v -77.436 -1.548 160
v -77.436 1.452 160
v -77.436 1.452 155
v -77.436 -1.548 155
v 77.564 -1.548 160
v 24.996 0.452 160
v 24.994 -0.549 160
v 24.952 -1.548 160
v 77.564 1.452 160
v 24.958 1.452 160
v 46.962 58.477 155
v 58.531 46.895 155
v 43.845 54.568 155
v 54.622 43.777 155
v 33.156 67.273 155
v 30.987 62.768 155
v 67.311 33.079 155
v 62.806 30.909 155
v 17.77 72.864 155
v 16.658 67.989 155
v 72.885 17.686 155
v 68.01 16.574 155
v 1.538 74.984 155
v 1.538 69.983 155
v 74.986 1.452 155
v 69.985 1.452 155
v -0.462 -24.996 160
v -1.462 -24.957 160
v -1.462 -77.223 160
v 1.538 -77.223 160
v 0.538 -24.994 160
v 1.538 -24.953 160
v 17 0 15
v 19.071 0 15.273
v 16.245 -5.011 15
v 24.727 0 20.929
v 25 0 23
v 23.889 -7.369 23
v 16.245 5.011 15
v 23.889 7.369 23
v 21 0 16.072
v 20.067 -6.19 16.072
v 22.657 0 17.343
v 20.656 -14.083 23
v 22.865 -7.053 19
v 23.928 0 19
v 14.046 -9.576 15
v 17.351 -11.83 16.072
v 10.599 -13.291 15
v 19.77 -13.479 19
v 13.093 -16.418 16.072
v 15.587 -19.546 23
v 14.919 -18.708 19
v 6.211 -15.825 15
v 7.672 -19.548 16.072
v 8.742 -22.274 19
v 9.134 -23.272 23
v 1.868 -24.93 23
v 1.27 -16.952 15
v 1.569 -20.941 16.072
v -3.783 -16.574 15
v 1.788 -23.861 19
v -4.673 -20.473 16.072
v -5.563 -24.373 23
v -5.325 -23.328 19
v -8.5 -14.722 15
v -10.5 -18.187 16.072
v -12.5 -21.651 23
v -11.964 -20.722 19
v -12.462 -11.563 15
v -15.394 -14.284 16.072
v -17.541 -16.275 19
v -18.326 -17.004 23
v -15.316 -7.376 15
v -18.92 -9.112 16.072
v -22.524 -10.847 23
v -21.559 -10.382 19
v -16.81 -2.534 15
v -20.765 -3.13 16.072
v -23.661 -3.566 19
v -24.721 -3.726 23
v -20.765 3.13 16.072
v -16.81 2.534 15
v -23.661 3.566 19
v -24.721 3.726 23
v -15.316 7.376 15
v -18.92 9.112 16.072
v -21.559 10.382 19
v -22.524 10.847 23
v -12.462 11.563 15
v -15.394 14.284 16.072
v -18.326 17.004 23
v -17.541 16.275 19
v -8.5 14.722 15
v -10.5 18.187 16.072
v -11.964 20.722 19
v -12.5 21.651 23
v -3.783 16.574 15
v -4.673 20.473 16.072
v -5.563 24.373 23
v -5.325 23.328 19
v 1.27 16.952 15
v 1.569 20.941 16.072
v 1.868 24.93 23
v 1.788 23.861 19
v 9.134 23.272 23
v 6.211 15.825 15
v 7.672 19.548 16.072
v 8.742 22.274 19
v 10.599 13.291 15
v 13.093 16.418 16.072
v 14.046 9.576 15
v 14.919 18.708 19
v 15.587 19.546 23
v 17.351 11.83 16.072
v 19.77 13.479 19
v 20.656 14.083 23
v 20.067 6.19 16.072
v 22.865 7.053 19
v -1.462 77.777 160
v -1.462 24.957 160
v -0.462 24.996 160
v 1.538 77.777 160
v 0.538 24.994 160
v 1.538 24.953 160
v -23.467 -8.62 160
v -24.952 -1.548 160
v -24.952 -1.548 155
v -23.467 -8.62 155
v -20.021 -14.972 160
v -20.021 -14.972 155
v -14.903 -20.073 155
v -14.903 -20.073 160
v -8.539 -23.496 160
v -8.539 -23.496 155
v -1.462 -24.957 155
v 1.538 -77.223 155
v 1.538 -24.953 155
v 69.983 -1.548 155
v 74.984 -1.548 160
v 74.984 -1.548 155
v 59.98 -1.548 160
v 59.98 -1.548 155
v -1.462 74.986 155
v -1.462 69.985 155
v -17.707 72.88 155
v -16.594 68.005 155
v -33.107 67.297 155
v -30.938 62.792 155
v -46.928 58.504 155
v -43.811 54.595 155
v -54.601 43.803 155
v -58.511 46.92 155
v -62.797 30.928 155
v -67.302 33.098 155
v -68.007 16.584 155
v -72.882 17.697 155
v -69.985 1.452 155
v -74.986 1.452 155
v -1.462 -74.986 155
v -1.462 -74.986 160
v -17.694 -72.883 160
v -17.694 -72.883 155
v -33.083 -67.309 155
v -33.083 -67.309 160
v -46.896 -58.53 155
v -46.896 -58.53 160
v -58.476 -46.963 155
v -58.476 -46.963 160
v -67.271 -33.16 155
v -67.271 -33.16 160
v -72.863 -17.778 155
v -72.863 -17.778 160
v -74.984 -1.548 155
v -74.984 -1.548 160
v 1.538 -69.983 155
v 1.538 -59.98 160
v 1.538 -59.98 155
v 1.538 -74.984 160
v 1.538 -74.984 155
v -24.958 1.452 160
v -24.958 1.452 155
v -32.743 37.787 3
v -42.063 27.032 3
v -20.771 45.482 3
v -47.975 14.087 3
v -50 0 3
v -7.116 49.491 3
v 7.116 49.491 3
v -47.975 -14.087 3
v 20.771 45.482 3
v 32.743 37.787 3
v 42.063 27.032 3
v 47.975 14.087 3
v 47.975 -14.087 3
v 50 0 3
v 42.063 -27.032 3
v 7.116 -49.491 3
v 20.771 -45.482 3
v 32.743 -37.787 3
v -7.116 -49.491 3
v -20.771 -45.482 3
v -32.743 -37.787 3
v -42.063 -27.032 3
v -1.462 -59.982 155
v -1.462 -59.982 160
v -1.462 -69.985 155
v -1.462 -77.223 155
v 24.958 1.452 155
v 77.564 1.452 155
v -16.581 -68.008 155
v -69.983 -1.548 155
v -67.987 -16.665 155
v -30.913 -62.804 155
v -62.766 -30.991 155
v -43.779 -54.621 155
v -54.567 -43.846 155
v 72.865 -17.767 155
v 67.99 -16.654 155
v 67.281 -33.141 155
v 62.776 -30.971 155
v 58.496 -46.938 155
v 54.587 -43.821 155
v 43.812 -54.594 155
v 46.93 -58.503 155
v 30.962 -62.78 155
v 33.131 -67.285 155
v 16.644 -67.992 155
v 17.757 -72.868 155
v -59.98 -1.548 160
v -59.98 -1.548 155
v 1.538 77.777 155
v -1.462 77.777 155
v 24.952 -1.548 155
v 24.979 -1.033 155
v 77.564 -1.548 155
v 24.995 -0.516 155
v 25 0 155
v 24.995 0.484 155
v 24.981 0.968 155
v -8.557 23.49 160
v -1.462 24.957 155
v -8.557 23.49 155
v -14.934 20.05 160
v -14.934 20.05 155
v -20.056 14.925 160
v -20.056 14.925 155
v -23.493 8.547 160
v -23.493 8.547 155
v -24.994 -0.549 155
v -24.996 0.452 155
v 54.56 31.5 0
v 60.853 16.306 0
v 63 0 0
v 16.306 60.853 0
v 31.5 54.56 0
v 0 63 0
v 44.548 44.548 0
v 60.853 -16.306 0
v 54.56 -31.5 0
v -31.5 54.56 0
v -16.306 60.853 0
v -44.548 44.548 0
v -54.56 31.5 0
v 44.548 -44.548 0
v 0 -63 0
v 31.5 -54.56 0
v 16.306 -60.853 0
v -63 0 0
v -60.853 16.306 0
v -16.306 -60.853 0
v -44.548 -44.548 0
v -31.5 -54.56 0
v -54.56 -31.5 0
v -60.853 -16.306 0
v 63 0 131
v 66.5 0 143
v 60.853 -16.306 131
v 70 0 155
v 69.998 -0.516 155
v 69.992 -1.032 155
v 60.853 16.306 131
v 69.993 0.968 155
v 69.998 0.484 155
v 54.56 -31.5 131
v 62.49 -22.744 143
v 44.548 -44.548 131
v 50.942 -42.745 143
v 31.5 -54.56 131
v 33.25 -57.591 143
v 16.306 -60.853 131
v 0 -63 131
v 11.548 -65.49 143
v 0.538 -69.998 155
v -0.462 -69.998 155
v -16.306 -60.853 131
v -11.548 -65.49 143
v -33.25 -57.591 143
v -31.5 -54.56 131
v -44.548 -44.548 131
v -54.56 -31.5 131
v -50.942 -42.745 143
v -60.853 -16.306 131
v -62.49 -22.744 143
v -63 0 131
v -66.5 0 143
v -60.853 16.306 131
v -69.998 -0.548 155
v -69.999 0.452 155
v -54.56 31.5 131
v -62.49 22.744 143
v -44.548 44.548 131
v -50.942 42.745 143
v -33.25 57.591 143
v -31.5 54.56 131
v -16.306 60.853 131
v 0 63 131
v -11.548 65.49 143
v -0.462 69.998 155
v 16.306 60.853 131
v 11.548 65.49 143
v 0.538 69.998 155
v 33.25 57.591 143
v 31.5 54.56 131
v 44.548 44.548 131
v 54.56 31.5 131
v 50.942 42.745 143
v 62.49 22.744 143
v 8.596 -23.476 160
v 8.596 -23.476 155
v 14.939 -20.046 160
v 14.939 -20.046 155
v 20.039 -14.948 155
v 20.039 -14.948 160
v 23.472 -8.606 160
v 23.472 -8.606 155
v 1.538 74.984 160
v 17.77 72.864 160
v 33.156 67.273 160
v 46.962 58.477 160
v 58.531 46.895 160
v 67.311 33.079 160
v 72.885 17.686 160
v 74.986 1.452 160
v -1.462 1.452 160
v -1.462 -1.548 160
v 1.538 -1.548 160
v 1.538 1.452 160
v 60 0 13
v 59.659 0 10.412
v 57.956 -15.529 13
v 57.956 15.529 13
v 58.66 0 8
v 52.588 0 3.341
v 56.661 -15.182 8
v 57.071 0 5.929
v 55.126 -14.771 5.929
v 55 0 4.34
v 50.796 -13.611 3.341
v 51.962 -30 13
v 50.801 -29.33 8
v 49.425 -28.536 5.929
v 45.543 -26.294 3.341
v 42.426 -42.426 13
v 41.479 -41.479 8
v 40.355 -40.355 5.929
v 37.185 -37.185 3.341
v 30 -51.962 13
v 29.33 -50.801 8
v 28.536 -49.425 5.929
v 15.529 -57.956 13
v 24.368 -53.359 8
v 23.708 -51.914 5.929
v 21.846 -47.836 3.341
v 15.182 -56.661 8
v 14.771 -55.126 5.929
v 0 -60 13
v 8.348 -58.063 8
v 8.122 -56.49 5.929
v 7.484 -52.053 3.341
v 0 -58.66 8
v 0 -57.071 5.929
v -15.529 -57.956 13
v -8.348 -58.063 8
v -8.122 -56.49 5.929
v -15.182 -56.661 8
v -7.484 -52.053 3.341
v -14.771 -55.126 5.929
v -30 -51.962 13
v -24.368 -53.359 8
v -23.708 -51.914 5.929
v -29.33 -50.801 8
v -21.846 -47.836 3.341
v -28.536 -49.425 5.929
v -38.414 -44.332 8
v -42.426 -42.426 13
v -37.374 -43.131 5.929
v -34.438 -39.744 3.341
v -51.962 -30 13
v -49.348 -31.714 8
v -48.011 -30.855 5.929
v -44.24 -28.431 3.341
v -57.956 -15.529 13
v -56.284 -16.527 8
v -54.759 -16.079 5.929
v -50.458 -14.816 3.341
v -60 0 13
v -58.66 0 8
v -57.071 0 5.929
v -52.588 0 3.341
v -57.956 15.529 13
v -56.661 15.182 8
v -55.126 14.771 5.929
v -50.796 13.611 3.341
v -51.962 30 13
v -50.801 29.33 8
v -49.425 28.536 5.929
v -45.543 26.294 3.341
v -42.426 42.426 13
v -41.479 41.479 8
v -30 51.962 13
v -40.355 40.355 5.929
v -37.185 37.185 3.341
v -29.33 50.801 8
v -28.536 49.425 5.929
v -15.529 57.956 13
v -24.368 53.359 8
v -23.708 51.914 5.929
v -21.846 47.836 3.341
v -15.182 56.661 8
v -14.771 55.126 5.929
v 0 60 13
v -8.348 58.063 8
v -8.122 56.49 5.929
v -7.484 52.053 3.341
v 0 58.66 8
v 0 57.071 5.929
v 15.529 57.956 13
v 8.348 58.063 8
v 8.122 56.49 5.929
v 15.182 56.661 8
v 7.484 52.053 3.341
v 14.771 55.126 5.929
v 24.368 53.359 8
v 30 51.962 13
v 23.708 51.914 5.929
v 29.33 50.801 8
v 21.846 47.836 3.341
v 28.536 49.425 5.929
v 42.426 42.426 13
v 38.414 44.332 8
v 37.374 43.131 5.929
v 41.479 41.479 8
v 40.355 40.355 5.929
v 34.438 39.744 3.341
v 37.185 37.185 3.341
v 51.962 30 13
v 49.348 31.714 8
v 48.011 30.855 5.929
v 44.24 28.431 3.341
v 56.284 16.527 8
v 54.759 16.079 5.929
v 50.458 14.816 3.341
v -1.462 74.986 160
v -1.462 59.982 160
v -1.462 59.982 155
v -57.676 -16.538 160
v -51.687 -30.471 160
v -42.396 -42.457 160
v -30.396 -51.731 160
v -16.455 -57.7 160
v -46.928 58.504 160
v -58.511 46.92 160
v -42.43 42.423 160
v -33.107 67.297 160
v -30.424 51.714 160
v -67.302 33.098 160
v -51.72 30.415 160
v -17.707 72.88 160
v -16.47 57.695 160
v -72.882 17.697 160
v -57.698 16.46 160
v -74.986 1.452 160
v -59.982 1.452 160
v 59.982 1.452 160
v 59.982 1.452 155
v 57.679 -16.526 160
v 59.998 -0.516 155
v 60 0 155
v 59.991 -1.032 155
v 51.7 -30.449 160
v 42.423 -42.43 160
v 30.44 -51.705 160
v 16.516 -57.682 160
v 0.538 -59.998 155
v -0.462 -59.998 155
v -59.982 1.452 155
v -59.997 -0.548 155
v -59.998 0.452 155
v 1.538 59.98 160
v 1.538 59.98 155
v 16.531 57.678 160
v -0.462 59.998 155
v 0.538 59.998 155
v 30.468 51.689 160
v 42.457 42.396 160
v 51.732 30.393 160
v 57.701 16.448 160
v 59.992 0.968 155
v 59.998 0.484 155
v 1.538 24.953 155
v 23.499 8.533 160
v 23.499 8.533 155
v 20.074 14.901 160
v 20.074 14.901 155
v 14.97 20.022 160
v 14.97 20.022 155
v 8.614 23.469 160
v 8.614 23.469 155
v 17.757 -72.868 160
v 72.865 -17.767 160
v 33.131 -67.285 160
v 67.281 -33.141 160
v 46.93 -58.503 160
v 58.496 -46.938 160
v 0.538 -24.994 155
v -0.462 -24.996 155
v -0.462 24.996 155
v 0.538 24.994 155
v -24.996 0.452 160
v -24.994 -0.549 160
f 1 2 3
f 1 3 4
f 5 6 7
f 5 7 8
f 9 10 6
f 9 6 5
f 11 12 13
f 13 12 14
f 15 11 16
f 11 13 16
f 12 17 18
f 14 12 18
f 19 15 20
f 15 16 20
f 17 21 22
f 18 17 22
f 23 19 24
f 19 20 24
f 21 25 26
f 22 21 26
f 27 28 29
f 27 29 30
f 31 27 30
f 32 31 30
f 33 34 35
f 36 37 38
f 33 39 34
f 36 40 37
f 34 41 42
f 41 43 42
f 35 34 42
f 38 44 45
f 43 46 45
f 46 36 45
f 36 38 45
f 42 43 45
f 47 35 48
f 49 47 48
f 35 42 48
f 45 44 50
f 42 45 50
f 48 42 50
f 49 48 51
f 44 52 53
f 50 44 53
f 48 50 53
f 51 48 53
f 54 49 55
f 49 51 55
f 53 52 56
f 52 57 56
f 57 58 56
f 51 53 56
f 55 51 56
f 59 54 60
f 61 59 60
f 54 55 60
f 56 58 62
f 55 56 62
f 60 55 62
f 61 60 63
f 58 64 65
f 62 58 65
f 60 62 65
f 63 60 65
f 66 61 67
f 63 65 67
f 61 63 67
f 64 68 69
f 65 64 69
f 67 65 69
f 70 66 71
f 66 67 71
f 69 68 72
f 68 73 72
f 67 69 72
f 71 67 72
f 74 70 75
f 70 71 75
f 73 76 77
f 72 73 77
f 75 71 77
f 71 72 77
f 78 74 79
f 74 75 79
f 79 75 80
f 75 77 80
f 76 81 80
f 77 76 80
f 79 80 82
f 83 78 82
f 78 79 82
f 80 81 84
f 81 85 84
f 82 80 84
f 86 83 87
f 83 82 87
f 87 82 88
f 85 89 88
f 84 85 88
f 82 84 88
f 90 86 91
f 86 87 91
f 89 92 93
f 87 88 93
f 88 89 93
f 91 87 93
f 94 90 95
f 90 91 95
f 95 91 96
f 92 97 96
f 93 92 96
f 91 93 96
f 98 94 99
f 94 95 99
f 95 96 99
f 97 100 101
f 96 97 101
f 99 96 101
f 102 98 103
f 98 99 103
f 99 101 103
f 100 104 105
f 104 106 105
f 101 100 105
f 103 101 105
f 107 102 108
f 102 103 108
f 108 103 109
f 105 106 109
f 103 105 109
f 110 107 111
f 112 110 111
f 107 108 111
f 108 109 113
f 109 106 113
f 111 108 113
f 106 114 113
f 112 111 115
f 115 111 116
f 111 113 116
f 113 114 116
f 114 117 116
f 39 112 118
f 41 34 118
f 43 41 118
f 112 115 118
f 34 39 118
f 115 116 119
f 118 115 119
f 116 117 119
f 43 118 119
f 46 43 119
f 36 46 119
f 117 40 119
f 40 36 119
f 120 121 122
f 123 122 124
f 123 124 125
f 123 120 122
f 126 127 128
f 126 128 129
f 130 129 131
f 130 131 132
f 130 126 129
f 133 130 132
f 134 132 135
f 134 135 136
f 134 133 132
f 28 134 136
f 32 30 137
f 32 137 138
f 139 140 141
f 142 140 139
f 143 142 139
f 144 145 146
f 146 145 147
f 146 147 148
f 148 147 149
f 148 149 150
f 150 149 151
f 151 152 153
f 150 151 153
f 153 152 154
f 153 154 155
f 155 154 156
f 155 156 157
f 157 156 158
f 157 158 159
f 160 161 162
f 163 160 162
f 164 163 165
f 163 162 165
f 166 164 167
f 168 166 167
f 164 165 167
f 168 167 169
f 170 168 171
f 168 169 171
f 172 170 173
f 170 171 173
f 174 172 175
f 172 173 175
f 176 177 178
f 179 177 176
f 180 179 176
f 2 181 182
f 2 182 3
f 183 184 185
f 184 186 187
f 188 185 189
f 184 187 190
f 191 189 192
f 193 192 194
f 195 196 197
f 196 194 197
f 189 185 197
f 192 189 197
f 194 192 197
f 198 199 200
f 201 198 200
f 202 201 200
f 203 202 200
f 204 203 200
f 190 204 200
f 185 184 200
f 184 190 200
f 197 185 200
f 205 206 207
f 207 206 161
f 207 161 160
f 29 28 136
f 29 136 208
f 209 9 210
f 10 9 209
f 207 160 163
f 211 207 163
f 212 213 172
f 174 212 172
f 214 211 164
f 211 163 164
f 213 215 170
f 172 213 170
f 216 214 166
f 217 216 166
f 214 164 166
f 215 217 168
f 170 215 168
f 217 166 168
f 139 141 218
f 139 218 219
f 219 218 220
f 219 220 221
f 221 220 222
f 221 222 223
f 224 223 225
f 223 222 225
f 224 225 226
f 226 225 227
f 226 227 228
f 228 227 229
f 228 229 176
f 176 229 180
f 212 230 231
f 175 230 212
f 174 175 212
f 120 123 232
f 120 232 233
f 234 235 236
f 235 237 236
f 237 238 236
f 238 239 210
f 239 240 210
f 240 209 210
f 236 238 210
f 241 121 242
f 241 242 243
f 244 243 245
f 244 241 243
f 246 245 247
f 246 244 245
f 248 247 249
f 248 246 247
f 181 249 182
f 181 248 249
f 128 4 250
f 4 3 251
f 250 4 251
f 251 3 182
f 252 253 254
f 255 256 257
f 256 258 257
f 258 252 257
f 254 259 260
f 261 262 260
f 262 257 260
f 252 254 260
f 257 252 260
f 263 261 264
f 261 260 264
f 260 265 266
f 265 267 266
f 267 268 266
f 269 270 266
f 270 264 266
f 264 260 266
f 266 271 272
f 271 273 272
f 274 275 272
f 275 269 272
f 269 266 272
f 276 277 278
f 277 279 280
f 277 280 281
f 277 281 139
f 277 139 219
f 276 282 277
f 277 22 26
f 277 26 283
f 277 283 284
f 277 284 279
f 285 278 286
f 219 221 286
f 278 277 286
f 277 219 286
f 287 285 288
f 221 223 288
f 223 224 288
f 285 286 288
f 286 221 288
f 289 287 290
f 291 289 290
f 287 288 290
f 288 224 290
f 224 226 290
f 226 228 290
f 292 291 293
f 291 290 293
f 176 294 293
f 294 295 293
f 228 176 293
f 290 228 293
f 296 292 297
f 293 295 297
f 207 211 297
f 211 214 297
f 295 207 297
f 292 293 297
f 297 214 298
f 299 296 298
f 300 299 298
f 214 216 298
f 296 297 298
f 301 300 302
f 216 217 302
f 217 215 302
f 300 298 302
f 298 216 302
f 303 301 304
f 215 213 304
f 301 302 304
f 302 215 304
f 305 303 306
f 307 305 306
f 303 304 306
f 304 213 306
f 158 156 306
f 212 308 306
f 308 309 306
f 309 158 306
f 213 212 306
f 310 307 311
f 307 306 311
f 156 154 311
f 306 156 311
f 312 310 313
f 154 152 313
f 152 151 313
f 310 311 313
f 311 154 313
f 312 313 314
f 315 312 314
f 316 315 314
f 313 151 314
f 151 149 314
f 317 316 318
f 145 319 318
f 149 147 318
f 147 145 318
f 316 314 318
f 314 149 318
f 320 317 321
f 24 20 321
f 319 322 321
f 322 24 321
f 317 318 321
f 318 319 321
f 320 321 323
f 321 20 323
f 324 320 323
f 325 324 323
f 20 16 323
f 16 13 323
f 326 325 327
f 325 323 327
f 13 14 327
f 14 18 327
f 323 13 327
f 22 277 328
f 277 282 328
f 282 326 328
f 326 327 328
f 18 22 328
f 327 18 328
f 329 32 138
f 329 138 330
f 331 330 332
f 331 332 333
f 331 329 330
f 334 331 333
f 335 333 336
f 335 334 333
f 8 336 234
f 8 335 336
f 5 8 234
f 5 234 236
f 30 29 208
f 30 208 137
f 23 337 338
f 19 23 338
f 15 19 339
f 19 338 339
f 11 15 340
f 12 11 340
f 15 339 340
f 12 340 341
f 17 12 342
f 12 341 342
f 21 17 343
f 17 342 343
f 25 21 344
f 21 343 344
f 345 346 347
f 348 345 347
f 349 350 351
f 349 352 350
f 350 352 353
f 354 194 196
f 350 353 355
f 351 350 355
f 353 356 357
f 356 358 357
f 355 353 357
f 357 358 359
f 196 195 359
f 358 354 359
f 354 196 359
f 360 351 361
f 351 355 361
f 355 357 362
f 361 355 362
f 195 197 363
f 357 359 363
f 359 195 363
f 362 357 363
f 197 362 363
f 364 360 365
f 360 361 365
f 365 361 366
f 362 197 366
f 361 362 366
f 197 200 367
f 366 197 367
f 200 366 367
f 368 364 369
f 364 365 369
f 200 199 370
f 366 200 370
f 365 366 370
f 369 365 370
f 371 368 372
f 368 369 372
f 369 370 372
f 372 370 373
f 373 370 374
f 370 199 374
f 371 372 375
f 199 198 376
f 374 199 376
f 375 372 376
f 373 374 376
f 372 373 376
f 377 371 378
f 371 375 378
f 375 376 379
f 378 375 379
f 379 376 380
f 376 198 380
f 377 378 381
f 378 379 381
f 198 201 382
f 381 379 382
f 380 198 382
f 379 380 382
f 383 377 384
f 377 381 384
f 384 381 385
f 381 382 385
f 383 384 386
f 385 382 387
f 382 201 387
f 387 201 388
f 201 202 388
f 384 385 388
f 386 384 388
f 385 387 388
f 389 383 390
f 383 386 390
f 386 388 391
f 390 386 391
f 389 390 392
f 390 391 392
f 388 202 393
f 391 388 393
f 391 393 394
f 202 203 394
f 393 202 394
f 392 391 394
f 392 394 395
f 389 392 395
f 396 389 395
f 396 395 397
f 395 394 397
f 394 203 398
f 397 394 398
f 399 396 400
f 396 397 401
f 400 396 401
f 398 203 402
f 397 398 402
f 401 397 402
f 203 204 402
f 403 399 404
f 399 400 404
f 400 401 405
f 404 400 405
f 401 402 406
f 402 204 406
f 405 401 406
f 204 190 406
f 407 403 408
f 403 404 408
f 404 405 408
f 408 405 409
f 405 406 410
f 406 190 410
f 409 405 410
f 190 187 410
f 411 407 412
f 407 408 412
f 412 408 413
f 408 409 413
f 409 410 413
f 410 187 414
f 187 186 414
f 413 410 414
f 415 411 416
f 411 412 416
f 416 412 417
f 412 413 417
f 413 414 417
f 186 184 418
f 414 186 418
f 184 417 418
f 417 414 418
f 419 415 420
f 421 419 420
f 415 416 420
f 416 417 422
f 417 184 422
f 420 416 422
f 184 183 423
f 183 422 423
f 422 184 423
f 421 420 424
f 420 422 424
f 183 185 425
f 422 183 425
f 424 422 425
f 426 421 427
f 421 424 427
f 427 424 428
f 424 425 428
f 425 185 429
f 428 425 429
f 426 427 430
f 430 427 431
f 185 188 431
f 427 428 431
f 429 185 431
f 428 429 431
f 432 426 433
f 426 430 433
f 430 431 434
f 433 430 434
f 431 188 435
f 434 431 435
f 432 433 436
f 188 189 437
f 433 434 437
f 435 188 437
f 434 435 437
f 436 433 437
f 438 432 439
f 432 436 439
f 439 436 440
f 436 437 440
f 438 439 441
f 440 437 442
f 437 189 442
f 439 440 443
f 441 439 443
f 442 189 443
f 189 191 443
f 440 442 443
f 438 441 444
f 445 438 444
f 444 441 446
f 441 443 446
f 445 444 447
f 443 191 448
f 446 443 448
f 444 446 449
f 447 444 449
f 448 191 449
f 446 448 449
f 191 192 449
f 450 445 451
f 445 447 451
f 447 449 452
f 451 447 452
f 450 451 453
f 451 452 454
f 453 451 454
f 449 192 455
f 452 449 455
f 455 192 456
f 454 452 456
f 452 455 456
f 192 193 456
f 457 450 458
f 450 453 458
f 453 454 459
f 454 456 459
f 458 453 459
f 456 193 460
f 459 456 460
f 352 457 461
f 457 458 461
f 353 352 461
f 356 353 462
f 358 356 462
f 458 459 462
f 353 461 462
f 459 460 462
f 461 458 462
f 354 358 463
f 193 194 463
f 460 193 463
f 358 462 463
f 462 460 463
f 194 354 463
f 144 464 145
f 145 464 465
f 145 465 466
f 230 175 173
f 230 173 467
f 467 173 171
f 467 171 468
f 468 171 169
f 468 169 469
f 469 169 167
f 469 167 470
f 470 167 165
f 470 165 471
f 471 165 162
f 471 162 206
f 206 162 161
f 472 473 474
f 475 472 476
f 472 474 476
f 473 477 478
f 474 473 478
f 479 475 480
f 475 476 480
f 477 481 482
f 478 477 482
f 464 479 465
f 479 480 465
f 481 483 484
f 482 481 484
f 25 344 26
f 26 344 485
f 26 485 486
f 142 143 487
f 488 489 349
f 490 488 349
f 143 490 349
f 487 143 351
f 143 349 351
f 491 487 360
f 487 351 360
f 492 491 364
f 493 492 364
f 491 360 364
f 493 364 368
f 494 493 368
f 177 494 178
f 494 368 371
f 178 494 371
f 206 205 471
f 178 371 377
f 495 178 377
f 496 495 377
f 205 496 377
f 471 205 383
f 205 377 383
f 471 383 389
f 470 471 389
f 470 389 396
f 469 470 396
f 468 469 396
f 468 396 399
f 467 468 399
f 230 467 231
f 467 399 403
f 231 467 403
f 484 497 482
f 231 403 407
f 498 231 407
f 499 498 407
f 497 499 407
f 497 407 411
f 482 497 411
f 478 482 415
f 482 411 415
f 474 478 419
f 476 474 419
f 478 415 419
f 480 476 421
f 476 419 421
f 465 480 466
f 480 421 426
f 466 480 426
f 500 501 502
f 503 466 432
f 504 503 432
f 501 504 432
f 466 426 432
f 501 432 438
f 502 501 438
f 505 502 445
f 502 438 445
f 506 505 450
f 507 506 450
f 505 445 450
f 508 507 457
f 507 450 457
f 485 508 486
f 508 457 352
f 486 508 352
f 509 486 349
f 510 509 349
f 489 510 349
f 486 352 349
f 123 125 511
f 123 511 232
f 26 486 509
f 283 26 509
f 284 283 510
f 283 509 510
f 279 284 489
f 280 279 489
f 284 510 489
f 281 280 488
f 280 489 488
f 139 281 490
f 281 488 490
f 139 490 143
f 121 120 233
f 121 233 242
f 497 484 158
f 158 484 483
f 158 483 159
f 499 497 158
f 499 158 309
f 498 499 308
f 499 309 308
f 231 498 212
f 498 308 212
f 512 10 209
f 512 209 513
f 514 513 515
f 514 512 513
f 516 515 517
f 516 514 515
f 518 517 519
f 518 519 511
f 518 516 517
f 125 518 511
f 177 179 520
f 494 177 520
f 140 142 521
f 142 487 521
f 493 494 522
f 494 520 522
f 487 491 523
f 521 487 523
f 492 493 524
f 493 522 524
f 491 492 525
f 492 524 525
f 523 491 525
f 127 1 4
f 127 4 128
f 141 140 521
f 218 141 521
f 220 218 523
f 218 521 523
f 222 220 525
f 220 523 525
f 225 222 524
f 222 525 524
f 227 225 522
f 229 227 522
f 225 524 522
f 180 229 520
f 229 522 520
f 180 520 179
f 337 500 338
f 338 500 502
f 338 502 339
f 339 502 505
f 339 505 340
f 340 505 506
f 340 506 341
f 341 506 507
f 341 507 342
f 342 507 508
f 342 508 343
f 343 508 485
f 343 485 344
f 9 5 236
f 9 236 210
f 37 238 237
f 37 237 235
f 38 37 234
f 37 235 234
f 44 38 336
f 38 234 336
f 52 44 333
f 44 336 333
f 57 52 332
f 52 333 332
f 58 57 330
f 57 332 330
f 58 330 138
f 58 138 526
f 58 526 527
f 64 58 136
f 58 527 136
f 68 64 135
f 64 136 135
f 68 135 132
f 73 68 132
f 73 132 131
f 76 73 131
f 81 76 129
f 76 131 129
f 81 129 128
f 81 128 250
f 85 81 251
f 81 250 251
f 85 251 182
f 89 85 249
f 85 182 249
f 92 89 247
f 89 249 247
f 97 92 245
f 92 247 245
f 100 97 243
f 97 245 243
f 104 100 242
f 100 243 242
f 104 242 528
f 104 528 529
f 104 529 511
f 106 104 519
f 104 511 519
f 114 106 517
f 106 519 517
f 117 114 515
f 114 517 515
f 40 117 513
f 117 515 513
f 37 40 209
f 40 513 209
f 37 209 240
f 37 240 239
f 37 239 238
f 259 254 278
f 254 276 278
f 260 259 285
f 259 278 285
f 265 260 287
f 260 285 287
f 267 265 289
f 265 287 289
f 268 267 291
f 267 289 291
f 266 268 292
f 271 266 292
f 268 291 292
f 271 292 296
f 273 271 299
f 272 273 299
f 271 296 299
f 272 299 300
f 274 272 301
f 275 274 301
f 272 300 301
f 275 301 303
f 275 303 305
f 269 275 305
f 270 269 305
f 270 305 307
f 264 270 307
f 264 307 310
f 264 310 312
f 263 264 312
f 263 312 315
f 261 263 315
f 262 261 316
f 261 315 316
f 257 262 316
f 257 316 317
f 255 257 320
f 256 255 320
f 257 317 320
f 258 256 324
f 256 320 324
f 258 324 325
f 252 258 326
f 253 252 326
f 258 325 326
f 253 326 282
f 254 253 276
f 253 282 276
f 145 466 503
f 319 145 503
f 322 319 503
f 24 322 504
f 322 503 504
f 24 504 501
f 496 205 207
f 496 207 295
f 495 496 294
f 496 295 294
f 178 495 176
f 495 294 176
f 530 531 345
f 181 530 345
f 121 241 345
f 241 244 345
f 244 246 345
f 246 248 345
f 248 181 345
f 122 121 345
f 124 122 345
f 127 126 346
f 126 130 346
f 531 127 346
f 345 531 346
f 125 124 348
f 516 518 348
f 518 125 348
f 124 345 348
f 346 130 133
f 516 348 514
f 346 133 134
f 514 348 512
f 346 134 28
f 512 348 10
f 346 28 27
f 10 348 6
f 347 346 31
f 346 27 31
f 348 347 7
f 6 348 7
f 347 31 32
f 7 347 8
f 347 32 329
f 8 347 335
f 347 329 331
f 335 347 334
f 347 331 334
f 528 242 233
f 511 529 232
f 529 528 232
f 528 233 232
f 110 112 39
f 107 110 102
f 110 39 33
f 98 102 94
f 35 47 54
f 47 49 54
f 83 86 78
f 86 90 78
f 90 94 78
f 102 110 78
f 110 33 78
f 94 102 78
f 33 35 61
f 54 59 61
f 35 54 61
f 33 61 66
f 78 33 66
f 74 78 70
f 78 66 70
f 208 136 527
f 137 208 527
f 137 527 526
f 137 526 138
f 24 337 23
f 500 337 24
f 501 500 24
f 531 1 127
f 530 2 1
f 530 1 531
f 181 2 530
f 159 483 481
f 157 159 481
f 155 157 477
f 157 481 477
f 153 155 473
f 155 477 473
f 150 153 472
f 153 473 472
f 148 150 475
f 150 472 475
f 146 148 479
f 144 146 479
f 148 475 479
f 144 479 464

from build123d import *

# Parameters (mm, degrees)
F4_DEPTH = 5
F7_DEPTH = 155.001
F8_DEPTH = 155.001


with BuildPart() as f1:
    # F0 (on Front) → F1 (revolve)
    with BuildSketch(Plane.XZ):
        with BuildLine():
            Line((0, 160), (0, 15))
            Line((0, 15), (17, 15))
            ThreePointArc((17, 15), (22.6568542495, 17.3431457505), (25, 23))
            Line((25, 23), (25, 160))
            Line((25, 160), (0, 160))
        make_face()
    revolve(axis=Axis((0, 0, 87.5), (0, 0, -1)))

    # F3 (on offset) → F4 (join)
    with BuildSketch(Plane.XY.offset(160)):
        with BuildLine():
            Line((-77.4360820651, 1.4515812248), (-77.4360820651, -1.5484187752))
            Line((-77.4360820651, -1.5484187752), (-24.9520019096, -1.5484187752))
            ThreePointArc((-24.9520019096, -1.5484187752), (-24.999952943, -0.0485061653), (-24.9578226604, 1.4515812248))
            Line((-24.9578226604, 1.4515812248), (-77.4360820651, 1.4515812248))
        make_face()
        with BuildLine():
            ThreePointArc((-24.9578226604, 1.4515812248), (-24.999952943, -0.0485061653), (-24.9520019096, -1.5484187752))
            Line((-24.9520019096, -1.5484187752), (-1.4620974865, -1.5484187752))
            Line((-1.4620974865, -1.5484187752), (-1.4620974865, 1.4515812248))
            Line((-1.4620974865, 1.4515812248), (-24.9578226604, 1.4515812248))
        make_face()
        with BuildLine():
            Line((-1.4620974865, -1.5484187752), (-24.9520019096, -1.5484187752))
            ThreePointArc((-24.9520019096, -1.5484187752), (-17.6470684335, -17.7082177449), (-1.4620974865, -24.9572087971))
            Line((-1.4620974865, -24.9572087971), (-1.4620974865, -1.5484187752))
        make_face()
        with BuildLine():
            Line((1.5379025135, -1.5484187752), (-1.4620974865, -1.5484187752))
            Line((-1.4620974865, -1.5484187752), (-1.4620974865, -24.9572087971))
            ThreePointArc((-1.4620974865, -24.9572087971), (0.037970923, -24.9999711642), (1.5379025135, -24.952652281))
            Line((1.5379025135, -24.952652281), (1.5379025135, -1.5484187752))
        make_face()
        with BuildLine():
            ThreePointArc((-1.4620974865, 24.9572087971), (-17.6813935263, 17.6739447483), (-24.9578226604, 1.4515812248))
            Line((-24.9578226604, 1.4515812248), (-1.4620974865, 1.4515812248))
            Line((-1.4620974865, 1.4515812248), (-1.4620974865, 24.9572087971))
        make_face()
        with BuildLine():
            ThreePointArc((1.5379025135, -24.952652281), (0.037970923, -24.9999711642), (-1.4620974865, -24.9572087971))
            Line((-1.4620974865, -24.9572087971), (-1.4620974865, -77.2232338786))
            Line((-1.4620974865, -77.2232338786), (1.5379025135, -77.2232338786))
            Line((1.5379025135, -77.2232338786), (1.5379025135, -24.952652281))
        make_face()
        with BuildLine():
            Line((1.5379025135, 1.4515812248), (1.5379025135, -1.5484187752))
            Line((1.5379025135, -1.5484187752), (24.9520019096, -1.5484187752))
            ThreePointArc((24.9520019096, -1.5484187752), (24.9879975962, -0.7745812611), (25, 0))
            ThreePointArc((25, 0), (24.9894534405, 0.7260969254), (24.9578226604, 1.4515812248))
            Line((24.9578226604, 1.4515812248), (1.5379025135, 1.4515812248))
        make_face()
        with BuildLine():
            Line((24.9520019096, -1.5484187752), (1.5379025135, -1.5484187752))
            Line((1.5379025135, -1.5484187752), (1.5379025135, -24.952652281))
            ThreePointArc((1.5379025135, -24.952652281), (17.6739439737, -17.6813943006), (24.9520019096, -1.5484187752))
        make_face()
        with BuildLine():
            Line((-1.4620974865, 24.9572087971), (-1.4620974865, 1.4515812248))
            Line((-1.4620974865, 1.4515812248), (1.5379025135, 1.4515812248))
            Line((1.5379025135, 1.4515812248), (1.5379025135, 24.952652281))
            ThreePointArc((1.5379025135, 24.952652281), (0.037970923, 24.9999711642), (-1.4620974865, 24.9572087971))
        make_face()
        with BuildLine():
            Line((-1.4620974865, 77.7767661214), (-1.4620974865, 24.9572087971))
            ThreePointArc((-1.4620974865, 24.9572087971), (0.037970923, 24.9999711642), (1.5379025135, 24.952652281))
            Line((1.5379025135, 24.952652281), (1.5379025135, 77.7767661214))
            Line((1.5379025135, 77.7767661214), (-1.4620974865, 77.7767661214))
        make_face()
        with BuildLine():
            ThreePointArc((25, 0), (24.9879975962, -0.7745812611), (24.9520019096, -1.5484187752))
            Line((24.9520019096, -1.5484187752), (77.5639179349, -1.5484187752))
            Line((77.5639179349, -1.5484187752), (77.5639179349, 1.4515812248))
            Line((77.5639179349, 1.4515812248), (24.9578226604, 1.4515812248))
            ThreePointArc((24.9578226604, 1.4515812248), (24.9894534405, 0.7260969254), (25, 0))
        make_face()
        with BuildLine():
            Line((1.5379025135, 24.952652281), (1.5379025135, 1.4515812248))
            Line((1.5379025135, 1.4515812248), (24.9578226604, 1.4515812248))
            ThreePointArc((24.9578226604, 1.4515812248), (17.7082169718, 17.6470692093), (1.5379025135, 24.952652281))
        make_face()
    extrude(amount=-F4_DEPTH)


with BuildPart() as f6:
    # F5 (on Front) → F6 (revolve)
    with BuildSketch(Plane.XZ):
        with BuildLine():
            Line((0, 3), (0, 0))
            Line((0, 0), (63, 0))
            Line((63, 0), (63, 131))
            Line((63, 131), (70, 155))
            Line((70, 155), (75, 155))
            Line((75, 155), (75, 160))
            Line((75, 160), (60, 160))
            Line((60, 160), (60, 13))
            ThreePointArc((60, 13), (57.0710678119, 5.9289321881), (50, 3))
            Line((50, 3), (0, 3))
        make_face()
    revolve(axis=Axis((0, 0, 1.5), (0, 0, -1)))

    # F7 (cut, through all): a face of the model
    f7_faces = [f1.part.faces().sort_by_distance(p)[0] for p in [
        (0.0379025135, -77.2232338786, 157.5),
    ]]
    extrude(f7_faces, amount=-F7_DEPTH, mode=Mode.SUBTRACT)

    # F8 (cut, through all): a face of the model
    f8_faces = [f1.part.faces().sort_by_distance(p)[0] for p in [
        (-77.4360820651, -0.0484187752, 157.5),
    ]]
    extrude(f8_faces, amount=-F8_DEPTH, mode=Mode.SUBTRACT)


solid = Compound([f1.part, f6.part])
